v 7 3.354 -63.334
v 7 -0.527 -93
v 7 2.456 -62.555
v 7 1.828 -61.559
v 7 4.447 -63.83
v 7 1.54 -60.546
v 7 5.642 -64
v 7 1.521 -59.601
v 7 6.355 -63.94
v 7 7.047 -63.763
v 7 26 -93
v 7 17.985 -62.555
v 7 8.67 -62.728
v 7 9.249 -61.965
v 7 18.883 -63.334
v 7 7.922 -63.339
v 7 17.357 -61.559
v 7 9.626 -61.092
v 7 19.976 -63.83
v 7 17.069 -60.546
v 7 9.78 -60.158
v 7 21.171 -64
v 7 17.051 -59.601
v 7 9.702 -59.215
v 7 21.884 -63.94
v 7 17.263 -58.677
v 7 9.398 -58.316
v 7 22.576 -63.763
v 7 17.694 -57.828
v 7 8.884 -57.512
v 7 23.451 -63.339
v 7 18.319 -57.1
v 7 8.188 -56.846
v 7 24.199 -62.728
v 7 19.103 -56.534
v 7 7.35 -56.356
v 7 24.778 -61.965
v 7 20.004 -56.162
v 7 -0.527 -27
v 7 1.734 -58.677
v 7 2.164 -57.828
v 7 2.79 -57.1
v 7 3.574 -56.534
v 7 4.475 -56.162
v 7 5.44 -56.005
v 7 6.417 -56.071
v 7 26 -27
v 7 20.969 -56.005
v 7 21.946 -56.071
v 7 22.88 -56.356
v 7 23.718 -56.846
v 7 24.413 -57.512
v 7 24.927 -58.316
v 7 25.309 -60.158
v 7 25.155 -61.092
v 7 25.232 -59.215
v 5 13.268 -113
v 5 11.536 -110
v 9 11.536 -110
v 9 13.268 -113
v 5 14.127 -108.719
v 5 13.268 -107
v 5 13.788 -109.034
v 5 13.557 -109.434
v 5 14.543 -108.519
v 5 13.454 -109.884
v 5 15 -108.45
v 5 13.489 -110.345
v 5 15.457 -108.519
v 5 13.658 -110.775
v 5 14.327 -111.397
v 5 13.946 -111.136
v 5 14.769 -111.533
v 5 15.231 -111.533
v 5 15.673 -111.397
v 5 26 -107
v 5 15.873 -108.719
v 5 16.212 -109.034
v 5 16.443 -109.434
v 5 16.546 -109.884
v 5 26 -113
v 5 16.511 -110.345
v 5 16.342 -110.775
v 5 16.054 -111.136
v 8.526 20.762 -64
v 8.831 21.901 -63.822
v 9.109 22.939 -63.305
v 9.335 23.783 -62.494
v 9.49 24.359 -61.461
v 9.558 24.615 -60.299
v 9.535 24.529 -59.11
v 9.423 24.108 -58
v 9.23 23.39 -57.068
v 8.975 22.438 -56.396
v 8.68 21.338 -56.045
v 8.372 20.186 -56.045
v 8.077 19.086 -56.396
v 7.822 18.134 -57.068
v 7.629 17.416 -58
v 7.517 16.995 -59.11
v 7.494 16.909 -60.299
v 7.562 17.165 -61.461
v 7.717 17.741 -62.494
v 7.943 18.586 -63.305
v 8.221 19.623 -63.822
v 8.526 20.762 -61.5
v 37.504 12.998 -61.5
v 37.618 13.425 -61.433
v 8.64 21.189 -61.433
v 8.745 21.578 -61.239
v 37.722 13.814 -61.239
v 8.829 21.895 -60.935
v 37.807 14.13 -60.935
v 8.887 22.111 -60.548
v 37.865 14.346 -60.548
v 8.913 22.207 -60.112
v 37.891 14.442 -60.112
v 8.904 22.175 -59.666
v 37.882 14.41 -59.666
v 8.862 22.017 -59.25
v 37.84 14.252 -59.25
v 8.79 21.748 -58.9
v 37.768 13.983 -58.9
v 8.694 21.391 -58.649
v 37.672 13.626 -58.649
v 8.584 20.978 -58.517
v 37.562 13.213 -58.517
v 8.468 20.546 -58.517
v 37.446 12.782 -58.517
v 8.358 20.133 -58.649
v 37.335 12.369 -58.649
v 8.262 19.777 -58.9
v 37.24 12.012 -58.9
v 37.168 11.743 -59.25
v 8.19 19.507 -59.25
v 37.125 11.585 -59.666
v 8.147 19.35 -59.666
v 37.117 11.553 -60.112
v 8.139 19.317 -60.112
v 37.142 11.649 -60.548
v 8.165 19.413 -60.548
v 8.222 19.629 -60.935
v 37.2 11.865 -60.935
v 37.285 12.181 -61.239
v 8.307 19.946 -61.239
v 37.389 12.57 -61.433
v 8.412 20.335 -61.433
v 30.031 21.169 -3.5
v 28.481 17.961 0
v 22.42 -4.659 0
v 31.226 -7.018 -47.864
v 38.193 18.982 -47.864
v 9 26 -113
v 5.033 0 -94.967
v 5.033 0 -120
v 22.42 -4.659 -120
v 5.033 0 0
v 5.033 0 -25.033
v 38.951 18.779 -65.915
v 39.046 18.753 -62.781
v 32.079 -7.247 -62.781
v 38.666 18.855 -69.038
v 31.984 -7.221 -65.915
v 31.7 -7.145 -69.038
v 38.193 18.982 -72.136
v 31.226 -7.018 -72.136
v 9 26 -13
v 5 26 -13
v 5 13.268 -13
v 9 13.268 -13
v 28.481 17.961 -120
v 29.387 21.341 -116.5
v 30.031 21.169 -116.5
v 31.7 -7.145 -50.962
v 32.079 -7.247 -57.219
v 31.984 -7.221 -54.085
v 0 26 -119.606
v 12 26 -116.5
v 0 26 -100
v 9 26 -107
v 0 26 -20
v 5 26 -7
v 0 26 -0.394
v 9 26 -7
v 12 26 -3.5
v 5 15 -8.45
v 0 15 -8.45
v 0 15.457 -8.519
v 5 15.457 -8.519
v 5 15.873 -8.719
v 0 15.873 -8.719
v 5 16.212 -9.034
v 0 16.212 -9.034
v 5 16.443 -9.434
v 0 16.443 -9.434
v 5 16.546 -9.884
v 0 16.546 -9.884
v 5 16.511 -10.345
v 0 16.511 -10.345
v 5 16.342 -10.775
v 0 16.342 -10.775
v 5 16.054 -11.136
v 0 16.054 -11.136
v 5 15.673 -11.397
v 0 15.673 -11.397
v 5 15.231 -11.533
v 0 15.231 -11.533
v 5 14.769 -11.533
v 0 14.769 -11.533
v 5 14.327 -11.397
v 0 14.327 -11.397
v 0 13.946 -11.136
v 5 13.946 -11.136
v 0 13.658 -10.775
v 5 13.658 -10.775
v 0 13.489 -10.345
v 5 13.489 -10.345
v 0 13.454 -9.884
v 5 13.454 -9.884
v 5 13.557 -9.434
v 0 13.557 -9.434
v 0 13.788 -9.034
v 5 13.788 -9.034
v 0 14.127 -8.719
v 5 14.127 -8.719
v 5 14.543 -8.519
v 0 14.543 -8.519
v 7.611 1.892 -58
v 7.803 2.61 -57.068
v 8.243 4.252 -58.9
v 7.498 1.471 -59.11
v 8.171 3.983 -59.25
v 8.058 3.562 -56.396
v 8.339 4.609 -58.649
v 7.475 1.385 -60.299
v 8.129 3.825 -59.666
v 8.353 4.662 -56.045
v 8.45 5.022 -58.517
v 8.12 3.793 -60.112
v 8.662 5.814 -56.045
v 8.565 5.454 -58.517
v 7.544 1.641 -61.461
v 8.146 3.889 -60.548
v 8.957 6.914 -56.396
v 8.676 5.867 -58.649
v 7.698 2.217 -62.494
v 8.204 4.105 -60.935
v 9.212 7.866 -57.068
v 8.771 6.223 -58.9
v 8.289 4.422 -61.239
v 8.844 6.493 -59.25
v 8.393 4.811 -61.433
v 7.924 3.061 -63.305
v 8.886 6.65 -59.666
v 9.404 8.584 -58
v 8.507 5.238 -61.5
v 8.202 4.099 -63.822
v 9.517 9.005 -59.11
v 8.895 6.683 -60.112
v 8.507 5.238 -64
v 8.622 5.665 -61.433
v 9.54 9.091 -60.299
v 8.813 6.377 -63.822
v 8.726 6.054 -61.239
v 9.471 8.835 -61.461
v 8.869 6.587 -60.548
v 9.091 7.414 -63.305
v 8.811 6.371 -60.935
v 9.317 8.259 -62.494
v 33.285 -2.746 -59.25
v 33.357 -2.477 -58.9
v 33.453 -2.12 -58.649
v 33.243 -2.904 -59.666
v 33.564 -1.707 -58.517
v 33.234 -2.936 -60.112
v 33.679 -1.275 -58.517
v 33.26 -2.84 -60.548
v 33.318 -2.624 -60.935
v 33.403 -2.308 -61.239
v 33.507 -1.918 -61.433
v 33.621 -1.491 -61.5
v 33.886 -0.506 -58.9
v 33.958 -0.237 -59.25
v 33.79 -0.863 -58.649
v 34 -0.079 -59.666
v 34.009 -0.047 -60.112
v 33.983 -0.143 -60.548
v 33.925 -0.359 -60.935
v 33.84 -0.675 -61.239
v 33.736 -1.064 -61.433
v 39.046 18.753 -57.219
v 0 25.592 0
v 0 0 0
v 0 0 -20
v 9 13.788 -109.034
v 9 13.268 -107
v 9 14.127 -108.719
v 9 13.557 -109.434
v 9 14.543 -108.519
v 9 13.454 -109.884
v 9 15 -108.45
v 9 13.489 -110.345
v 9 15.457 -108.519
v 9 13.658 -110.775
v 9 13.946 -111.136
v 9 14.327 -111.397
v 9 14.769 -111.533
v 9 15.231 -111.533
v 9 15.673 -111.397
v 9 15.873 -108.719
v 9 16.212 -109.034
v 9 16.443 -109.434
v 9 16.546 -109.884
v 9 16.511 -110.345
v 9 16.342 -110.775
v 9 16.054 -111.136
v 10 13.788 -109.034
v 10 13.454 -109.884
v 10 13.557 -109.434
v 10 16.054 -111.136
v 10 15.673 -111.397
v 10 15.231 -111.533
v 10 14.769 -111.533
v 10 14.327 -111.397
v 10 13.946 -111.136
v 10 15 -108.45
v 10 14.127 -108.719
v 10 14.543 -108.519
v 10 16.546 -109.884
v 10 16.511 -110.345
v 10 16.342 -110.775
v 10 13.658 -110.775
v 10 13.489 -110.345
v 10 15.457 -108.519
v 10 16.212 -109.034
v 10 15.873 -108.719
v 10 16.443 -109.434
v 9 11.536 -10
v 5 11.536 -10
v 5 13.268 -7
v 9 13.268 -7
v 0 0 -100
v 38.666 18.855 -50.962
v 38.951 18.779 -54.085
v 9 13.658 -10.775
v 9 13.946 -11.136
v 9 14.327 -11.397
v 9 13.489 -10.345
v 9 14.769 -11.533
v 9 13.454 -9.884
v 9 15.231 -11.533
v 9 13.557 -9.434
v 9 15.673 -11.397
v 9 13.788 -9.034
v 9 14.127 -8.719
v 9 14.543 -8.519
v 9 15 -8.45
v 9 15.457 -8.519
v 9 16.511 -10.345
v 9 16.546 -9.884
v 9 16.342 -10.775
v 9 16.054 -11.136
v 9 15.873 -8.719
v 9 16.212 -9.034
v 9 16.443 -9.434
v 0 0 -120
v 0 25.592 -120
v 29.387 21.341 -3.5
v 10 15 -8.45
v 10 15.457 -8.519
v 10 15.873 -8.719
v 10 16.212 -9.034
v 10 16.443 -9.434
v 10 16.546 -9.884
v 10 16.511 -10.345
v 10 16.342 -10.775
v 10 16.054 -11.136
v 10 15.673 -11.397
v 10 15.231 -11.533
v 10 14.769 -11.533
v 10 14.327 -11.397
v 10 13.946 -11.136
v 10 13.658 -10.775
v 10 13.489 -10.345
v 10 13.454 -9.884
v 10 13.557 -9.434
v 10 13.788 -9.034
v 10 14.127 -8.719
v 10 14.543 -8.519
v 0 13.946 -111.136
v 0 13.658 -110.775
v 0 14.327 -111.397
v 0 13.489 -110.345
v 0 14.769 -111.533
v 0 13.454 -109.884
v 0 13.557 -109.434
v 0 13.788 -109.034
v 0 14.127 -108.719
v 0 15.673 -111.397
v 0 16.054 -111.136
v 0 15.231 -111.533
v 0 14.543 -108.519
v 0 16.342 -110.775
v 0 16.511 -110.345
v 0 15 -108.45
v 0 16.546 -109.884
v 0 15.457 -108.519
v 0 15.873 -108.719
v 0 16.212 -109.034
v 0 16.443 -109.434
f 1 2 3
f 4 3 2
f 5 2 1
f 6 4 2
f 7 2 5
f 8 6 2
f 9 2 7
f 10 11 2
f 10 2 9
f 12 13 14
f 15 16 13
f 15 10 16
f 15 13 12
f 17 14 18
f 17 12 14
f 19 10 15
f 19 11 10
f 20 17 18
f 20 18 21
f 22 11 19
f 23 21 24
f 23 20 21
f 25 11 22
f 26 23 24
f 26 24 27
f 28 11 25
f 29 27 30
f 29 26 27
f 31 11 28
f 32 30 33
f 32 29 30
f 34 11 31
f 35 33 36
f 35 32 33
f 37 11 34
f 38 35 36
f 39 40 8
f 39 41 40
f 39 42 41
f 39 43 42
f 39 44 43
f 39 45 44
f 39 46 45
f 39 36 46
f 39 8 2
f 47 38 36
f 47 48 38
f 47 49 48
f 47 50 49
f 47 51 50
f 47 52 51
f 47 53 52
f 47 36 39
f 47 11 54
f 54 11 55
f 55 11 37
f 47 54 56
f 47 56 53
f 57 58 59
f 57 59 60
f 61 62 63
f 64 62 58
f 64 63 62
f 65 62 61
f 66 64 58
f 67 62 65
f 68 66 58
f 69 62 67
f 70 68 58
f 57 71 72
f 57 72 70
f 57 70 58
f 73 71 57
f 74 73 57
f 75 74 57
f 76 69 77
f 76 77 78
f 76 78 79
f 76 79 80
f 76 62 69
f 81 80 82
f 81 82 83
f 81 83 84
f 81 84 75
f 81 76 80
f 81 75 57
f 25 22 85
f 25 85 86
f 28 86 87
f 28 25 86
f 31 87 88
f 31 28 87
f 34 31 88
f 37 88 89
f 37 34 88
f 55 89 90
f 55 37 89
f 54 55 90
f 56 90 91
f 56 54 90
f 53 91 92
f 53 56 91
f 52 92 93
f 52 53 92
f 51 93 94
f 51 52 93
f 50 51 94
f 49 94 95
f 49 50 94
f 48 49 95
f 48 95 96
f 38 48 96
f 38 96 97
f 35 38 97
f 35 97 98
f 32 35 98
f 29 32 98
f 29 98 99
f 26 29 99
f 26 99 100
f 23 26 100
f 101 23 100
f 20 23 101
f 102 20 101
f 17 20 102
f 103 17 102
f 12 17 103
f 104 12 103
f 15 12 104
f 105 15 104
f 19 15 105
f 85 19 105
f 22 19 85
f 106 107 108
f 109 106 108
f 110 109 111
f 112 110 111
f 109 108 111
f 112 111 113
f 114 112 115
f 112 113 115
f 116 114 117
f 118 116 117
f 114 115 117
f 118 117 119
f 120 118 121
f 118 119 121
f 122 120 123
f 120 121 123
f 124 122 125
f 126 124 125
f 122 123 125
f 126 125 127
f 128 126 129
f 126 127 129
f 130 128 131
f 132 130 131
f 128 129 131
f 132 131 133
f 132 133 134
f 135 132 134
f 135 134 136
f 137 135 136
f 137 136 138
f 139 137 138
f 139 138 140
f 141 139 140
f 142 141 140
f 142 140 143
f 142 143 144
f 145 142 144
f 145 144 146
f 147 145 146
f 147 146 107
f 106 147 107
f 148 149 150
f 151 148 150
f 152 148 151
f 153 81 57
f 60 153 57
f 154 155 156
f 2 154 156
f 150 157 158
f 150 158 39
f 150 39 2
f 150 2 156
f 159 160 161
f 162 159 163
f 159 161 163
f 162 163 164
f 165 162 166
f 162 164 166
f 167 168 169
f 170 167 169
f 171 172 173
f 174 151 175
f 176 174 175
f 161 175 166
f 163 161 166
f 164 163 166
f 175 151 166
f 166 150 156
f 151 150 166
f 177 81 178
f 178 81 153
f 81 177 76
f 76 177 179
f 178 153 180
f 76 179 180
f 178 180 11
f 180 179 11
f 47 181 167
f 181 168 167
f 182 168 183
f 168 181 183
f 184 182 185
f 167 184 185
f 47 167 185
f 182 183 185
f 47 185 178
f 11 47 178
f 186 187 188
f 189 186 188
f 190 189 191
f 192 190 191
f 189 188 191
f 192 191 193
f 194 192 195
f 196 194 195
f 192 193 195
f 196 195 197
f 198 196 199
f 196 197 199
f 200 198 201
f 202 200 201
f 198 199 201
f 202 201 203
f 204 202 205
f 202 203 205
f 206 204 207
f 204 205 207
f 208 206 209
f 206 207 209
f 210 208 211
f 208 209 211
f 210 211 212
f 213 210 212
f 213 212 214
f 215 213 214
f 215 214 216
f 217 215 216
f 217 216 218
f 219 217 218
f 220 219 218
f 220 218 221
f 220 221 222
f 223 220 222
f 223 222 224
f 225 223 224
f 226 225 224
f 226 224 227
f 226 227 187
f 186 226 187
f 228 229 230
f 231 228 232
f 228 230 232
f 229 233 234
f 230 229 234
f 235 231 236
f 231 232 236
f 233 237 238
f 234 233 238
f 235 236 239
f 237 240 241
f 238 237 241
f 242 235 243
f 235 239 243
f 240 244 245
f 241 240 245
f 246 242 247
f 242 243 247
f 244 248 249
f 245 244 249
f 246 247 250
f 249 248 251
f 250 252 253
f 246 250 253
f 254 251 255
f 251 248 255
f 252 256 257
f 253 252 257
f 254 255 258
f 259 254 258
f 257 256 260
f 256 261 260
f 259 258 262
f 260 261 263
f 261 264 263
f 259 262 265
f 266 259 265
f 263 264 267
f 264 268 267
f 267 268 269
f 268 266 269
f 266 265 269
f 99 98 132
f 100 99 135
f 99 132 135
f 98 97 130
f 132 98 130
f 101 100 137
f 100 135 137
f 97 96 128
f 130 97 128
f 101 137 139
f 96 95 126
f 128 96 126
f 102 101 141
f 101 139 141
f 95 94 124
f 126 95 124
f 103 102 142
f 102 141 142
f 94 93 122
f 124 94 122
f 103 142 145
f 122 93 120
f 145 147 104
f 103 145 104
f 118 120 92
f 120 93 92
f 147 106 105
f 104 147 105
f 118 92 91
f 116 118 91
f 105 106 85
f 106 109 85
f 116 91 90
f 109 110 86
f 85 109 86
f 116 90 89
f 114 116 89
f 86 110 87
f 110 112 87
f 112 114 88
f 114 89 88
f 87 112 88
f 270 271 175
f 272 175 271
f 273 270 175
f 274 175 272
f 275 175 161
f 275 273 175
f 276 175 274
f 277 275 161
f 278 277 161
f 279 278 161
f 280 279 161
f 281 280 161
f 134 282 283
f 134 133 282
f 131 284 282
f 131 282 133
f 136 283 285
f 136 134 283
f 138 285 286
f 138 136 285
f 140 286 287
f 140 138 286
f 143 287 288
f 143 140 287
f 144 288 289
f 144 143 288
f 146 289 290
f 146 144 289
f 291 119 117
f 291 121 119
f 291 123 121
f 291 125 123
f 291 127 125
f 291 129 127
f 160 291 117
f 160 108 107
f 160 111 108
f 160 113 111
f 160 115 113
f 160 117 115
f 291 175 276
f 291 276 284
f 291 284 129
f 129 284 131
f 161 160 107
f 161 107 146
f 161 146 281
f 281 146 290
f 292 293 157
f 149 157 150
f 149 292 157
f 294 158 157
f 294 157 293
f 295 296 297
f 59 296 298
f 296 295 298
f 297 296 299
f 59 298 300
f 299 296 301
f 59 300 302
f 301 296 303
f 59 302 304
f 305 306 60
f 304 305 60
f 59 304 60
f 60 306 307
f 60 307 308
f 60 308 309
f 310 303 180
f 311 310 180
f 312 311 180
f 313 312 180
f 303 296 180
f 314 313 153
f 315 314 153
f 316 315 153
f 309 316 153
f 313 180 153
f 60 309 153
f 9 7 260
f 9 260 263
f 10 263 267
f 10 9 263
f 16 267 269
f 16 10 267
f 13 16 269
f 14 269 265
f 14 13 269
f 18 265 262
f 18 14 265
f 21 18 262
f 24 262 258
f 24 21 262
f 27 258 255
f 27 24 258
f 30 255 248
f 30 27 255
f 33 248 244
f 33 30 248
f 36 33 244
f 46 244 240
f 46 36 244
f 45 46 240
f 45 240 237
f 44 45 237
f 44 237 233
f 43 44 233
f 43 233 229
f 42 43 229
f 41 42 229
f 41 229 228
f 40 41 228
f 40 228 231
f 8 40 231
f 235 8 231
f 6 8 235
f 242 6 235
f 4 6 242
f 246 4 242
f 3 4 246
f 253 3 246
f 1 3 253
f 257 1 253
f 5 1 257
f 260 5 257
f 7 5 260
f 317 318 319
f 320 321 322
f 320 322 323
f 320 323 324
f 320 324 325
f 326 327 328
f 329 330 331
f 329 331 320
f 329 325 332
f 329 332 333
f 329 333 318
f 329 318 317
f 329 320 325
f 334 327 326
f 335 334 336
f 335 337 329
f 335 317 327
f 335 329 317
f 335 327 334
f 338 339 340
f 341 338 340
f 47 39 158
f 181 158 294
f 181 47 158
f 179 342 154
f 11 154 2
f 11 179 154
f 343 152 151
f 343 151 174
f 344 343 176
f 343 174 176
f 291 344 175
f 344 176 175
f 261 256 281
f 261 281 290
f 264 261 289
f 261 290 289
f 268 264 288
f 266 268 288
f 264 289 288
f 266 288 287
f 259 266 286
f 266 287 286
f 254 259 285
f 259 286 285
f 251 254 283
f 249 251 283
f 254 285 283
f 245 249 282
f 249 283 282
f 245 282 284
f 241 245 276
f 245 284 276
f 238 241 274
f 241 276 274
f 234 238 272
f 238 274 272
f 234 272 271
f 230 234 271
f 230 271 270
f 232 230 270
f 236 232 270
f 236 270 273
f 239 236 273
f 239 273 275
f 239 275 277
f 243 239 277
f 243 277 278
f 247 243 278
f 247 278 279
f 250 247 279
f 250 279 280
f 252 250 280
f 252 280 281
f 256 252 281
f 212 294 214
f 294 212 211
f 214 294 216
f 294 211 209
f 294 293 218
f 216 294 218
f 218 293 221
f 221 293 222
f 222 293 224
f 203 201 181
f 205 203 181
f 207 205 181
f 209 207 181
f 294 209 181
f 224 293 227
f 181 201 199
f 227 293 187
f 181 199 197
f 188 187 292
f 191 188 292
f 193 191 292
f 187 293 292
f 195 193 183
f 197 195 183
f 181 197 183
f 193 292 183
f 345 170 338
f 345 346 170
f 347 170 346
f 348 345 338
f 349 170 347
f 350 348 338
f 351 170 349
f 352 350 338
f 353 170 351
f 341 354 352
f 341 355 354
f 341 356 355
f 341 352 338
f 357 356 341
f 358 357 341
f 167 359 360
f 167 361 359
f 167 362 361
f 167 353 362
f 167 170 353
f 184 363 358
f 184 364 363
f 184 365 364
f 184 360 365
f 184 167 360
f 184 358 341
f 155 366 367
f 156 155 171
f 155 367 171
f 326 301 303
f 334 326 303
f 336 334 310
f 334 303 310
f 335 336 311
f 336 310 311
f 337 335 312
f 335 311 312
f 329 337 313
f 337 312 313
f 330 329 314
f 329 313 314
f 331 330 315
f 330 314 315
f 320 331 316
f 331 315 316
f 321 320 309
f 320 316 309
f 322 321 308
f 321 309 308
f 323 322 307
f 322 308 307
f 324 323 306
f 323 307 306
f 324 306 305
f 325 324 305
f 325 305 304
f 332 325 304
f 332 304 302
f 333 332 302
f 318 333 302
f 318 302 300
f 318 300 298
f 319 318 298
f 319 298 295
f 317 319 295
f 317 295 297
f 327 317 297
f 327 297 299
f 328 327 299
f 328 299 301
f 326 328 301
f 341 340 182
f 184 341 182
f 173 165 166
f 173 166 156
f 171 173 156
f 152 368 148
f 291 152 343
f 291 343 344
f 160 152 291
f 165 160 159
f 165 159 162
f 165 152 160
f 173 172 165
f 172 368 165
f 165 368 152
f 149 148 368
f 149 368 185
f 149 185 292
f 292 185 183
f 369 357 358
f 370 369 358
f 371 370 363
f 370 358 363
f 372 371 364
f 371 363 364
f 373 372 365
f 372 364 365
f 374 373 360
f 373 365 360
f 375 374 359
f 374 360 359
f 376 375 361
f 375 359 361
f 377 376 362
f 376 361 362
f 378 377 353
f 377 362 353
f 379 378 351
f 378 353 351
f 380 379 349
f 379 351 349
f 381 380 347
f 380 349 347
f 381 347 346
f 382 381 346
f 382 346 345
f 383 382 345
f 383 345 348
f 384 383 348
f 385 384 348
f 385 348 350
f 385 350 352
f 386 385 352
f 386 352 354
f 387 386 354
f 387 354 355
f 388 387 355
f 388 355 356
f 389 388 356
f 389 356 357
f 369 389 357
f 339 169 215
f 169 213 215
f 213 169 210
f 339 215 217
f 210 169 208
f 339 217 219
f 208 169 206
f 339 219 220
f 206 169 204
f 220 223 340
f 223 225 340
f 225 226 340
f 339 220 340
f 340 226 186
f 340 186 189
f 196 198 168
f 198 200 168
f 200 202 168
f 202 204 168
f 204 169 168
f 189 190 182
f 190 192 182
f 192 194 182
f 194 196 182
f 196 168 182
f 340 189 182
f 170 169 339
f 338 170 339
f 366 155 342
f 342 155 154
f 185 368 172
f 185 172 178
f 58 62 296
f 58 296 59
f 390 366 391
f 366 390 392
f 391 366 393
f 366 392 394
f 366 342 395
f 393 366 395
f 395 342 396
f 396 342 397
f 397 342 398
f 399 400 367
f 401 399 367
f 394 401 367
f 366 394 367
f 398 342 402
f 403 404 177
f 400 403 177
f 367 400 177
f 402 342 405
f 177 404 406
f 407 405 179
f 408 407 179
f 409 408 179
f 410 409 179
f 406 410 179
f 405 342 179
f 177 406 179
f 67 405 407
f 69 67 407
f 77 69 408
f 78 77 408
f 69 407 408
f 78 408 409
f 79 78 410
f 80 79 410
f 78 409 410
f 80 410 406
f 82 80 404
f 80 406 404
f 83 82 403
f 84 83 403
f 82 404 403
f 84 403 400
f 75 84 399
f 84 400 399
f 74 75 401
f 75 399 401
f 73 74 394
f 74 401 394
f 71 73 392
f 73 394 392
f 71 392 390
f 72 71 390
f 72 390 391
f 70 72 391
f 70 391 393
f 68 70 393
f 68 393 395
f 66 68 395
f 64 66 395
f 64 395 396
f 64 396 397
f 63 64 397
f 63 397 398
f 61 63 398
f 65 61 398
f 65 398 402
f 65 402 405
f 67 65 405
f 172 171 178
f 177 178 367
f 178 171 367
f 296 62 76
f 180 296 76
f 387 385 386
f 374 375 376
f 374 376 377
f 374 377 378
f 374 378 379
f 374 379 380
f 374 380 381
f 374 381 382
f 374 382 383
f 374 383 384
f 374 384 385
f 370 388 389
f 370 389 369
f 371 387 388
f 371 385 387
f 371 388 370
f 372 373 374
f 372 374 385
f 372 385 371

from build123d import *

# Parameters (mm, degrees)
BOSS_EXTRUDE1_DEPTH = 120
BOSS_EXTRUDE2_DEPTH = 26.917181
CUT_EXTRUDE3_DEPTH  = 34.246933562
SKETCH7_R           = 1.55
CUT_EXTRUDE4_DEPTH  = 10
CUT_EXTRUDE5_DEPTH  = 4
FILLET1_R           = 50
SKETCH10_R          = 1.5
CUT_EXTRUDE6_DEPTH  = 40.591109915
CHAMFER4_SIZE       = 3.5
SKETCH12_R          = 4
CUT_EXTRUDE8_DEPTH  = 5
SKETCH12_3_R        = 4
CUT_EXTRUDE9_DEPTH  = 9


with BuildPart() as part:
    # Sketch1 → Boss-Extrude1 (new body)
    with BuildSketch(Plane.XY):
        Polygon((12, 26), (5.033320997, 0), (22.41998587, -4.658742812), (29.386664873, 21.341257188), align=None)
        Polygon((0, 0), (0, 26), (12, 26), (5.033320997, 0), align=None)
    extrude(amount=-BOSS_EXTRUDE1_DEPTH)

    # Sketch3 → Boss-Extrude2 (add)
    with BuildSketch(Plane(origin=(7.303847577, 27.258330249, 0), x_dir=(0.965925826, -0.258819045, 0), z_dir=(0.258819045, 0.965925826, 0))):
        Polygon((22.861814743, 0), (32.861814743, 52.5), (32.861814743, 67.5), (22.861814743, 120), align=None)
    extrude(amount=-BOSS_EXTRUDE2_DEPTH)

    # Sketch6 → Cut-Extrude3 (cut, through all)
    with BuildSketch(Plane(origin=(0, 26, 0), x_dir=(1, 0, 0), z_dir=(0, 1, 0))):
        Polygon((0, 100), (7, 93), (7, 27), (0, 20), align=None)
    extrude(amount=-CUT_EXTRUDE3_DEPTH, mode=Mode.SUBTRACT)

    # Sketch7 → Cut-Extrude4 (cut)
    with BuildSketch(Plane.ZY):
        with Locations((-110, 15)):
            Circle(SKETCH7_R)
        with Locations((-10, 15)):
            Circle(SKETCH7_R)
    extrude(amount=-CUT_EXTRUDE4_DEPTH, mode=Mode.SUBTRACT)

    # Sketch8 → Cut-Extrude5 (cut)
    with BuildSketch(Plane.ZY.offset(-5)):
        Polygon((-113, 16.732050808), (-113, 26), (-107, 26), (-107, 16.732050808), (-107, 13.267949192), (-110, 11.535898385), (-113, 13.267949192), align=None)
        Polygon((-13, 26), (-13, 16.732050808), (-13, 13.267949192), (-10, 11.535898385), (-7, 13.267949192), (-7, 16.732050808), (-7, 26), align=None)
    extrude(amount=-CUT_EXTRUDE5_DEPTH, mode=Mode.SUBTRACT)

    # Fillet1
    fillet1_edges = [part.edges().sort_by_distance(p)[0] for p in [
        (35.562583594, 5.753066588, -52.5),
        (35.562583594, 5.753066588, -67.5),
    ]]
    fillet(fillet1_edges, radius=FILLET1_R)

    # Sketch10 → Cut-Extrude6 (cut, through all)
    with BuildSketch(Plane(origin=(31.742075559, -8.505263512, 0), x_dir=(0, 0, -1), z_dir=(0.965925826, -0.258819045, 0))):
        with Locations((60, 22.261309679)):
            Circle(SKETCH10_R)
        with Locations((60, 7.261309679)):
            Circle(SKETCH10_R)
    extrude(amount=-CUT_EXTRUDE6_DEPTH, mode=Mode.SUBTRACT)

    # Chamfer4
    chamfer4_edges = [part.edges().sort_by_distance(p)[0] for p in [
        (20.693332437, 23.670628594, -120),
        (20.693332437, 23.670628594, 0),
    ]]
    chamfer(chamfer4_edges, length=CHAMFER4_SIZE)

    # Sketch12 → Cut-Extrude8 (cut)
    with BuildSketch(Plane(origin=(-2.065328361, 0.553403067, 0), x_dir=(0, 0, -1), z_dir=(0.965925826, -0.258819045, 0))):
        with Locations((60, 22.261309679)):
            Circle(SKETCH12_R)
    extrude(amount=CUT_EXTRUDE8_DEPTH, mode=Mode.SUBTRACT)

    # Sketch12<3> → Cut-Extrude9 (cut)
    with BuildSketch(Plane(origin=(-2.065328361, 0.553403067, 0), x_dir=(0, 0, -1), z_dir=(0.965925826, -0.258819045, 0))):
        with Locations((60, 7.261309679)):
            Circle(SKETCH12_3_R)
    extrude(amount=CUT_EXTRUDE9_DEPTH, mode=Mode.SUBTRACT)


solid = part.part
